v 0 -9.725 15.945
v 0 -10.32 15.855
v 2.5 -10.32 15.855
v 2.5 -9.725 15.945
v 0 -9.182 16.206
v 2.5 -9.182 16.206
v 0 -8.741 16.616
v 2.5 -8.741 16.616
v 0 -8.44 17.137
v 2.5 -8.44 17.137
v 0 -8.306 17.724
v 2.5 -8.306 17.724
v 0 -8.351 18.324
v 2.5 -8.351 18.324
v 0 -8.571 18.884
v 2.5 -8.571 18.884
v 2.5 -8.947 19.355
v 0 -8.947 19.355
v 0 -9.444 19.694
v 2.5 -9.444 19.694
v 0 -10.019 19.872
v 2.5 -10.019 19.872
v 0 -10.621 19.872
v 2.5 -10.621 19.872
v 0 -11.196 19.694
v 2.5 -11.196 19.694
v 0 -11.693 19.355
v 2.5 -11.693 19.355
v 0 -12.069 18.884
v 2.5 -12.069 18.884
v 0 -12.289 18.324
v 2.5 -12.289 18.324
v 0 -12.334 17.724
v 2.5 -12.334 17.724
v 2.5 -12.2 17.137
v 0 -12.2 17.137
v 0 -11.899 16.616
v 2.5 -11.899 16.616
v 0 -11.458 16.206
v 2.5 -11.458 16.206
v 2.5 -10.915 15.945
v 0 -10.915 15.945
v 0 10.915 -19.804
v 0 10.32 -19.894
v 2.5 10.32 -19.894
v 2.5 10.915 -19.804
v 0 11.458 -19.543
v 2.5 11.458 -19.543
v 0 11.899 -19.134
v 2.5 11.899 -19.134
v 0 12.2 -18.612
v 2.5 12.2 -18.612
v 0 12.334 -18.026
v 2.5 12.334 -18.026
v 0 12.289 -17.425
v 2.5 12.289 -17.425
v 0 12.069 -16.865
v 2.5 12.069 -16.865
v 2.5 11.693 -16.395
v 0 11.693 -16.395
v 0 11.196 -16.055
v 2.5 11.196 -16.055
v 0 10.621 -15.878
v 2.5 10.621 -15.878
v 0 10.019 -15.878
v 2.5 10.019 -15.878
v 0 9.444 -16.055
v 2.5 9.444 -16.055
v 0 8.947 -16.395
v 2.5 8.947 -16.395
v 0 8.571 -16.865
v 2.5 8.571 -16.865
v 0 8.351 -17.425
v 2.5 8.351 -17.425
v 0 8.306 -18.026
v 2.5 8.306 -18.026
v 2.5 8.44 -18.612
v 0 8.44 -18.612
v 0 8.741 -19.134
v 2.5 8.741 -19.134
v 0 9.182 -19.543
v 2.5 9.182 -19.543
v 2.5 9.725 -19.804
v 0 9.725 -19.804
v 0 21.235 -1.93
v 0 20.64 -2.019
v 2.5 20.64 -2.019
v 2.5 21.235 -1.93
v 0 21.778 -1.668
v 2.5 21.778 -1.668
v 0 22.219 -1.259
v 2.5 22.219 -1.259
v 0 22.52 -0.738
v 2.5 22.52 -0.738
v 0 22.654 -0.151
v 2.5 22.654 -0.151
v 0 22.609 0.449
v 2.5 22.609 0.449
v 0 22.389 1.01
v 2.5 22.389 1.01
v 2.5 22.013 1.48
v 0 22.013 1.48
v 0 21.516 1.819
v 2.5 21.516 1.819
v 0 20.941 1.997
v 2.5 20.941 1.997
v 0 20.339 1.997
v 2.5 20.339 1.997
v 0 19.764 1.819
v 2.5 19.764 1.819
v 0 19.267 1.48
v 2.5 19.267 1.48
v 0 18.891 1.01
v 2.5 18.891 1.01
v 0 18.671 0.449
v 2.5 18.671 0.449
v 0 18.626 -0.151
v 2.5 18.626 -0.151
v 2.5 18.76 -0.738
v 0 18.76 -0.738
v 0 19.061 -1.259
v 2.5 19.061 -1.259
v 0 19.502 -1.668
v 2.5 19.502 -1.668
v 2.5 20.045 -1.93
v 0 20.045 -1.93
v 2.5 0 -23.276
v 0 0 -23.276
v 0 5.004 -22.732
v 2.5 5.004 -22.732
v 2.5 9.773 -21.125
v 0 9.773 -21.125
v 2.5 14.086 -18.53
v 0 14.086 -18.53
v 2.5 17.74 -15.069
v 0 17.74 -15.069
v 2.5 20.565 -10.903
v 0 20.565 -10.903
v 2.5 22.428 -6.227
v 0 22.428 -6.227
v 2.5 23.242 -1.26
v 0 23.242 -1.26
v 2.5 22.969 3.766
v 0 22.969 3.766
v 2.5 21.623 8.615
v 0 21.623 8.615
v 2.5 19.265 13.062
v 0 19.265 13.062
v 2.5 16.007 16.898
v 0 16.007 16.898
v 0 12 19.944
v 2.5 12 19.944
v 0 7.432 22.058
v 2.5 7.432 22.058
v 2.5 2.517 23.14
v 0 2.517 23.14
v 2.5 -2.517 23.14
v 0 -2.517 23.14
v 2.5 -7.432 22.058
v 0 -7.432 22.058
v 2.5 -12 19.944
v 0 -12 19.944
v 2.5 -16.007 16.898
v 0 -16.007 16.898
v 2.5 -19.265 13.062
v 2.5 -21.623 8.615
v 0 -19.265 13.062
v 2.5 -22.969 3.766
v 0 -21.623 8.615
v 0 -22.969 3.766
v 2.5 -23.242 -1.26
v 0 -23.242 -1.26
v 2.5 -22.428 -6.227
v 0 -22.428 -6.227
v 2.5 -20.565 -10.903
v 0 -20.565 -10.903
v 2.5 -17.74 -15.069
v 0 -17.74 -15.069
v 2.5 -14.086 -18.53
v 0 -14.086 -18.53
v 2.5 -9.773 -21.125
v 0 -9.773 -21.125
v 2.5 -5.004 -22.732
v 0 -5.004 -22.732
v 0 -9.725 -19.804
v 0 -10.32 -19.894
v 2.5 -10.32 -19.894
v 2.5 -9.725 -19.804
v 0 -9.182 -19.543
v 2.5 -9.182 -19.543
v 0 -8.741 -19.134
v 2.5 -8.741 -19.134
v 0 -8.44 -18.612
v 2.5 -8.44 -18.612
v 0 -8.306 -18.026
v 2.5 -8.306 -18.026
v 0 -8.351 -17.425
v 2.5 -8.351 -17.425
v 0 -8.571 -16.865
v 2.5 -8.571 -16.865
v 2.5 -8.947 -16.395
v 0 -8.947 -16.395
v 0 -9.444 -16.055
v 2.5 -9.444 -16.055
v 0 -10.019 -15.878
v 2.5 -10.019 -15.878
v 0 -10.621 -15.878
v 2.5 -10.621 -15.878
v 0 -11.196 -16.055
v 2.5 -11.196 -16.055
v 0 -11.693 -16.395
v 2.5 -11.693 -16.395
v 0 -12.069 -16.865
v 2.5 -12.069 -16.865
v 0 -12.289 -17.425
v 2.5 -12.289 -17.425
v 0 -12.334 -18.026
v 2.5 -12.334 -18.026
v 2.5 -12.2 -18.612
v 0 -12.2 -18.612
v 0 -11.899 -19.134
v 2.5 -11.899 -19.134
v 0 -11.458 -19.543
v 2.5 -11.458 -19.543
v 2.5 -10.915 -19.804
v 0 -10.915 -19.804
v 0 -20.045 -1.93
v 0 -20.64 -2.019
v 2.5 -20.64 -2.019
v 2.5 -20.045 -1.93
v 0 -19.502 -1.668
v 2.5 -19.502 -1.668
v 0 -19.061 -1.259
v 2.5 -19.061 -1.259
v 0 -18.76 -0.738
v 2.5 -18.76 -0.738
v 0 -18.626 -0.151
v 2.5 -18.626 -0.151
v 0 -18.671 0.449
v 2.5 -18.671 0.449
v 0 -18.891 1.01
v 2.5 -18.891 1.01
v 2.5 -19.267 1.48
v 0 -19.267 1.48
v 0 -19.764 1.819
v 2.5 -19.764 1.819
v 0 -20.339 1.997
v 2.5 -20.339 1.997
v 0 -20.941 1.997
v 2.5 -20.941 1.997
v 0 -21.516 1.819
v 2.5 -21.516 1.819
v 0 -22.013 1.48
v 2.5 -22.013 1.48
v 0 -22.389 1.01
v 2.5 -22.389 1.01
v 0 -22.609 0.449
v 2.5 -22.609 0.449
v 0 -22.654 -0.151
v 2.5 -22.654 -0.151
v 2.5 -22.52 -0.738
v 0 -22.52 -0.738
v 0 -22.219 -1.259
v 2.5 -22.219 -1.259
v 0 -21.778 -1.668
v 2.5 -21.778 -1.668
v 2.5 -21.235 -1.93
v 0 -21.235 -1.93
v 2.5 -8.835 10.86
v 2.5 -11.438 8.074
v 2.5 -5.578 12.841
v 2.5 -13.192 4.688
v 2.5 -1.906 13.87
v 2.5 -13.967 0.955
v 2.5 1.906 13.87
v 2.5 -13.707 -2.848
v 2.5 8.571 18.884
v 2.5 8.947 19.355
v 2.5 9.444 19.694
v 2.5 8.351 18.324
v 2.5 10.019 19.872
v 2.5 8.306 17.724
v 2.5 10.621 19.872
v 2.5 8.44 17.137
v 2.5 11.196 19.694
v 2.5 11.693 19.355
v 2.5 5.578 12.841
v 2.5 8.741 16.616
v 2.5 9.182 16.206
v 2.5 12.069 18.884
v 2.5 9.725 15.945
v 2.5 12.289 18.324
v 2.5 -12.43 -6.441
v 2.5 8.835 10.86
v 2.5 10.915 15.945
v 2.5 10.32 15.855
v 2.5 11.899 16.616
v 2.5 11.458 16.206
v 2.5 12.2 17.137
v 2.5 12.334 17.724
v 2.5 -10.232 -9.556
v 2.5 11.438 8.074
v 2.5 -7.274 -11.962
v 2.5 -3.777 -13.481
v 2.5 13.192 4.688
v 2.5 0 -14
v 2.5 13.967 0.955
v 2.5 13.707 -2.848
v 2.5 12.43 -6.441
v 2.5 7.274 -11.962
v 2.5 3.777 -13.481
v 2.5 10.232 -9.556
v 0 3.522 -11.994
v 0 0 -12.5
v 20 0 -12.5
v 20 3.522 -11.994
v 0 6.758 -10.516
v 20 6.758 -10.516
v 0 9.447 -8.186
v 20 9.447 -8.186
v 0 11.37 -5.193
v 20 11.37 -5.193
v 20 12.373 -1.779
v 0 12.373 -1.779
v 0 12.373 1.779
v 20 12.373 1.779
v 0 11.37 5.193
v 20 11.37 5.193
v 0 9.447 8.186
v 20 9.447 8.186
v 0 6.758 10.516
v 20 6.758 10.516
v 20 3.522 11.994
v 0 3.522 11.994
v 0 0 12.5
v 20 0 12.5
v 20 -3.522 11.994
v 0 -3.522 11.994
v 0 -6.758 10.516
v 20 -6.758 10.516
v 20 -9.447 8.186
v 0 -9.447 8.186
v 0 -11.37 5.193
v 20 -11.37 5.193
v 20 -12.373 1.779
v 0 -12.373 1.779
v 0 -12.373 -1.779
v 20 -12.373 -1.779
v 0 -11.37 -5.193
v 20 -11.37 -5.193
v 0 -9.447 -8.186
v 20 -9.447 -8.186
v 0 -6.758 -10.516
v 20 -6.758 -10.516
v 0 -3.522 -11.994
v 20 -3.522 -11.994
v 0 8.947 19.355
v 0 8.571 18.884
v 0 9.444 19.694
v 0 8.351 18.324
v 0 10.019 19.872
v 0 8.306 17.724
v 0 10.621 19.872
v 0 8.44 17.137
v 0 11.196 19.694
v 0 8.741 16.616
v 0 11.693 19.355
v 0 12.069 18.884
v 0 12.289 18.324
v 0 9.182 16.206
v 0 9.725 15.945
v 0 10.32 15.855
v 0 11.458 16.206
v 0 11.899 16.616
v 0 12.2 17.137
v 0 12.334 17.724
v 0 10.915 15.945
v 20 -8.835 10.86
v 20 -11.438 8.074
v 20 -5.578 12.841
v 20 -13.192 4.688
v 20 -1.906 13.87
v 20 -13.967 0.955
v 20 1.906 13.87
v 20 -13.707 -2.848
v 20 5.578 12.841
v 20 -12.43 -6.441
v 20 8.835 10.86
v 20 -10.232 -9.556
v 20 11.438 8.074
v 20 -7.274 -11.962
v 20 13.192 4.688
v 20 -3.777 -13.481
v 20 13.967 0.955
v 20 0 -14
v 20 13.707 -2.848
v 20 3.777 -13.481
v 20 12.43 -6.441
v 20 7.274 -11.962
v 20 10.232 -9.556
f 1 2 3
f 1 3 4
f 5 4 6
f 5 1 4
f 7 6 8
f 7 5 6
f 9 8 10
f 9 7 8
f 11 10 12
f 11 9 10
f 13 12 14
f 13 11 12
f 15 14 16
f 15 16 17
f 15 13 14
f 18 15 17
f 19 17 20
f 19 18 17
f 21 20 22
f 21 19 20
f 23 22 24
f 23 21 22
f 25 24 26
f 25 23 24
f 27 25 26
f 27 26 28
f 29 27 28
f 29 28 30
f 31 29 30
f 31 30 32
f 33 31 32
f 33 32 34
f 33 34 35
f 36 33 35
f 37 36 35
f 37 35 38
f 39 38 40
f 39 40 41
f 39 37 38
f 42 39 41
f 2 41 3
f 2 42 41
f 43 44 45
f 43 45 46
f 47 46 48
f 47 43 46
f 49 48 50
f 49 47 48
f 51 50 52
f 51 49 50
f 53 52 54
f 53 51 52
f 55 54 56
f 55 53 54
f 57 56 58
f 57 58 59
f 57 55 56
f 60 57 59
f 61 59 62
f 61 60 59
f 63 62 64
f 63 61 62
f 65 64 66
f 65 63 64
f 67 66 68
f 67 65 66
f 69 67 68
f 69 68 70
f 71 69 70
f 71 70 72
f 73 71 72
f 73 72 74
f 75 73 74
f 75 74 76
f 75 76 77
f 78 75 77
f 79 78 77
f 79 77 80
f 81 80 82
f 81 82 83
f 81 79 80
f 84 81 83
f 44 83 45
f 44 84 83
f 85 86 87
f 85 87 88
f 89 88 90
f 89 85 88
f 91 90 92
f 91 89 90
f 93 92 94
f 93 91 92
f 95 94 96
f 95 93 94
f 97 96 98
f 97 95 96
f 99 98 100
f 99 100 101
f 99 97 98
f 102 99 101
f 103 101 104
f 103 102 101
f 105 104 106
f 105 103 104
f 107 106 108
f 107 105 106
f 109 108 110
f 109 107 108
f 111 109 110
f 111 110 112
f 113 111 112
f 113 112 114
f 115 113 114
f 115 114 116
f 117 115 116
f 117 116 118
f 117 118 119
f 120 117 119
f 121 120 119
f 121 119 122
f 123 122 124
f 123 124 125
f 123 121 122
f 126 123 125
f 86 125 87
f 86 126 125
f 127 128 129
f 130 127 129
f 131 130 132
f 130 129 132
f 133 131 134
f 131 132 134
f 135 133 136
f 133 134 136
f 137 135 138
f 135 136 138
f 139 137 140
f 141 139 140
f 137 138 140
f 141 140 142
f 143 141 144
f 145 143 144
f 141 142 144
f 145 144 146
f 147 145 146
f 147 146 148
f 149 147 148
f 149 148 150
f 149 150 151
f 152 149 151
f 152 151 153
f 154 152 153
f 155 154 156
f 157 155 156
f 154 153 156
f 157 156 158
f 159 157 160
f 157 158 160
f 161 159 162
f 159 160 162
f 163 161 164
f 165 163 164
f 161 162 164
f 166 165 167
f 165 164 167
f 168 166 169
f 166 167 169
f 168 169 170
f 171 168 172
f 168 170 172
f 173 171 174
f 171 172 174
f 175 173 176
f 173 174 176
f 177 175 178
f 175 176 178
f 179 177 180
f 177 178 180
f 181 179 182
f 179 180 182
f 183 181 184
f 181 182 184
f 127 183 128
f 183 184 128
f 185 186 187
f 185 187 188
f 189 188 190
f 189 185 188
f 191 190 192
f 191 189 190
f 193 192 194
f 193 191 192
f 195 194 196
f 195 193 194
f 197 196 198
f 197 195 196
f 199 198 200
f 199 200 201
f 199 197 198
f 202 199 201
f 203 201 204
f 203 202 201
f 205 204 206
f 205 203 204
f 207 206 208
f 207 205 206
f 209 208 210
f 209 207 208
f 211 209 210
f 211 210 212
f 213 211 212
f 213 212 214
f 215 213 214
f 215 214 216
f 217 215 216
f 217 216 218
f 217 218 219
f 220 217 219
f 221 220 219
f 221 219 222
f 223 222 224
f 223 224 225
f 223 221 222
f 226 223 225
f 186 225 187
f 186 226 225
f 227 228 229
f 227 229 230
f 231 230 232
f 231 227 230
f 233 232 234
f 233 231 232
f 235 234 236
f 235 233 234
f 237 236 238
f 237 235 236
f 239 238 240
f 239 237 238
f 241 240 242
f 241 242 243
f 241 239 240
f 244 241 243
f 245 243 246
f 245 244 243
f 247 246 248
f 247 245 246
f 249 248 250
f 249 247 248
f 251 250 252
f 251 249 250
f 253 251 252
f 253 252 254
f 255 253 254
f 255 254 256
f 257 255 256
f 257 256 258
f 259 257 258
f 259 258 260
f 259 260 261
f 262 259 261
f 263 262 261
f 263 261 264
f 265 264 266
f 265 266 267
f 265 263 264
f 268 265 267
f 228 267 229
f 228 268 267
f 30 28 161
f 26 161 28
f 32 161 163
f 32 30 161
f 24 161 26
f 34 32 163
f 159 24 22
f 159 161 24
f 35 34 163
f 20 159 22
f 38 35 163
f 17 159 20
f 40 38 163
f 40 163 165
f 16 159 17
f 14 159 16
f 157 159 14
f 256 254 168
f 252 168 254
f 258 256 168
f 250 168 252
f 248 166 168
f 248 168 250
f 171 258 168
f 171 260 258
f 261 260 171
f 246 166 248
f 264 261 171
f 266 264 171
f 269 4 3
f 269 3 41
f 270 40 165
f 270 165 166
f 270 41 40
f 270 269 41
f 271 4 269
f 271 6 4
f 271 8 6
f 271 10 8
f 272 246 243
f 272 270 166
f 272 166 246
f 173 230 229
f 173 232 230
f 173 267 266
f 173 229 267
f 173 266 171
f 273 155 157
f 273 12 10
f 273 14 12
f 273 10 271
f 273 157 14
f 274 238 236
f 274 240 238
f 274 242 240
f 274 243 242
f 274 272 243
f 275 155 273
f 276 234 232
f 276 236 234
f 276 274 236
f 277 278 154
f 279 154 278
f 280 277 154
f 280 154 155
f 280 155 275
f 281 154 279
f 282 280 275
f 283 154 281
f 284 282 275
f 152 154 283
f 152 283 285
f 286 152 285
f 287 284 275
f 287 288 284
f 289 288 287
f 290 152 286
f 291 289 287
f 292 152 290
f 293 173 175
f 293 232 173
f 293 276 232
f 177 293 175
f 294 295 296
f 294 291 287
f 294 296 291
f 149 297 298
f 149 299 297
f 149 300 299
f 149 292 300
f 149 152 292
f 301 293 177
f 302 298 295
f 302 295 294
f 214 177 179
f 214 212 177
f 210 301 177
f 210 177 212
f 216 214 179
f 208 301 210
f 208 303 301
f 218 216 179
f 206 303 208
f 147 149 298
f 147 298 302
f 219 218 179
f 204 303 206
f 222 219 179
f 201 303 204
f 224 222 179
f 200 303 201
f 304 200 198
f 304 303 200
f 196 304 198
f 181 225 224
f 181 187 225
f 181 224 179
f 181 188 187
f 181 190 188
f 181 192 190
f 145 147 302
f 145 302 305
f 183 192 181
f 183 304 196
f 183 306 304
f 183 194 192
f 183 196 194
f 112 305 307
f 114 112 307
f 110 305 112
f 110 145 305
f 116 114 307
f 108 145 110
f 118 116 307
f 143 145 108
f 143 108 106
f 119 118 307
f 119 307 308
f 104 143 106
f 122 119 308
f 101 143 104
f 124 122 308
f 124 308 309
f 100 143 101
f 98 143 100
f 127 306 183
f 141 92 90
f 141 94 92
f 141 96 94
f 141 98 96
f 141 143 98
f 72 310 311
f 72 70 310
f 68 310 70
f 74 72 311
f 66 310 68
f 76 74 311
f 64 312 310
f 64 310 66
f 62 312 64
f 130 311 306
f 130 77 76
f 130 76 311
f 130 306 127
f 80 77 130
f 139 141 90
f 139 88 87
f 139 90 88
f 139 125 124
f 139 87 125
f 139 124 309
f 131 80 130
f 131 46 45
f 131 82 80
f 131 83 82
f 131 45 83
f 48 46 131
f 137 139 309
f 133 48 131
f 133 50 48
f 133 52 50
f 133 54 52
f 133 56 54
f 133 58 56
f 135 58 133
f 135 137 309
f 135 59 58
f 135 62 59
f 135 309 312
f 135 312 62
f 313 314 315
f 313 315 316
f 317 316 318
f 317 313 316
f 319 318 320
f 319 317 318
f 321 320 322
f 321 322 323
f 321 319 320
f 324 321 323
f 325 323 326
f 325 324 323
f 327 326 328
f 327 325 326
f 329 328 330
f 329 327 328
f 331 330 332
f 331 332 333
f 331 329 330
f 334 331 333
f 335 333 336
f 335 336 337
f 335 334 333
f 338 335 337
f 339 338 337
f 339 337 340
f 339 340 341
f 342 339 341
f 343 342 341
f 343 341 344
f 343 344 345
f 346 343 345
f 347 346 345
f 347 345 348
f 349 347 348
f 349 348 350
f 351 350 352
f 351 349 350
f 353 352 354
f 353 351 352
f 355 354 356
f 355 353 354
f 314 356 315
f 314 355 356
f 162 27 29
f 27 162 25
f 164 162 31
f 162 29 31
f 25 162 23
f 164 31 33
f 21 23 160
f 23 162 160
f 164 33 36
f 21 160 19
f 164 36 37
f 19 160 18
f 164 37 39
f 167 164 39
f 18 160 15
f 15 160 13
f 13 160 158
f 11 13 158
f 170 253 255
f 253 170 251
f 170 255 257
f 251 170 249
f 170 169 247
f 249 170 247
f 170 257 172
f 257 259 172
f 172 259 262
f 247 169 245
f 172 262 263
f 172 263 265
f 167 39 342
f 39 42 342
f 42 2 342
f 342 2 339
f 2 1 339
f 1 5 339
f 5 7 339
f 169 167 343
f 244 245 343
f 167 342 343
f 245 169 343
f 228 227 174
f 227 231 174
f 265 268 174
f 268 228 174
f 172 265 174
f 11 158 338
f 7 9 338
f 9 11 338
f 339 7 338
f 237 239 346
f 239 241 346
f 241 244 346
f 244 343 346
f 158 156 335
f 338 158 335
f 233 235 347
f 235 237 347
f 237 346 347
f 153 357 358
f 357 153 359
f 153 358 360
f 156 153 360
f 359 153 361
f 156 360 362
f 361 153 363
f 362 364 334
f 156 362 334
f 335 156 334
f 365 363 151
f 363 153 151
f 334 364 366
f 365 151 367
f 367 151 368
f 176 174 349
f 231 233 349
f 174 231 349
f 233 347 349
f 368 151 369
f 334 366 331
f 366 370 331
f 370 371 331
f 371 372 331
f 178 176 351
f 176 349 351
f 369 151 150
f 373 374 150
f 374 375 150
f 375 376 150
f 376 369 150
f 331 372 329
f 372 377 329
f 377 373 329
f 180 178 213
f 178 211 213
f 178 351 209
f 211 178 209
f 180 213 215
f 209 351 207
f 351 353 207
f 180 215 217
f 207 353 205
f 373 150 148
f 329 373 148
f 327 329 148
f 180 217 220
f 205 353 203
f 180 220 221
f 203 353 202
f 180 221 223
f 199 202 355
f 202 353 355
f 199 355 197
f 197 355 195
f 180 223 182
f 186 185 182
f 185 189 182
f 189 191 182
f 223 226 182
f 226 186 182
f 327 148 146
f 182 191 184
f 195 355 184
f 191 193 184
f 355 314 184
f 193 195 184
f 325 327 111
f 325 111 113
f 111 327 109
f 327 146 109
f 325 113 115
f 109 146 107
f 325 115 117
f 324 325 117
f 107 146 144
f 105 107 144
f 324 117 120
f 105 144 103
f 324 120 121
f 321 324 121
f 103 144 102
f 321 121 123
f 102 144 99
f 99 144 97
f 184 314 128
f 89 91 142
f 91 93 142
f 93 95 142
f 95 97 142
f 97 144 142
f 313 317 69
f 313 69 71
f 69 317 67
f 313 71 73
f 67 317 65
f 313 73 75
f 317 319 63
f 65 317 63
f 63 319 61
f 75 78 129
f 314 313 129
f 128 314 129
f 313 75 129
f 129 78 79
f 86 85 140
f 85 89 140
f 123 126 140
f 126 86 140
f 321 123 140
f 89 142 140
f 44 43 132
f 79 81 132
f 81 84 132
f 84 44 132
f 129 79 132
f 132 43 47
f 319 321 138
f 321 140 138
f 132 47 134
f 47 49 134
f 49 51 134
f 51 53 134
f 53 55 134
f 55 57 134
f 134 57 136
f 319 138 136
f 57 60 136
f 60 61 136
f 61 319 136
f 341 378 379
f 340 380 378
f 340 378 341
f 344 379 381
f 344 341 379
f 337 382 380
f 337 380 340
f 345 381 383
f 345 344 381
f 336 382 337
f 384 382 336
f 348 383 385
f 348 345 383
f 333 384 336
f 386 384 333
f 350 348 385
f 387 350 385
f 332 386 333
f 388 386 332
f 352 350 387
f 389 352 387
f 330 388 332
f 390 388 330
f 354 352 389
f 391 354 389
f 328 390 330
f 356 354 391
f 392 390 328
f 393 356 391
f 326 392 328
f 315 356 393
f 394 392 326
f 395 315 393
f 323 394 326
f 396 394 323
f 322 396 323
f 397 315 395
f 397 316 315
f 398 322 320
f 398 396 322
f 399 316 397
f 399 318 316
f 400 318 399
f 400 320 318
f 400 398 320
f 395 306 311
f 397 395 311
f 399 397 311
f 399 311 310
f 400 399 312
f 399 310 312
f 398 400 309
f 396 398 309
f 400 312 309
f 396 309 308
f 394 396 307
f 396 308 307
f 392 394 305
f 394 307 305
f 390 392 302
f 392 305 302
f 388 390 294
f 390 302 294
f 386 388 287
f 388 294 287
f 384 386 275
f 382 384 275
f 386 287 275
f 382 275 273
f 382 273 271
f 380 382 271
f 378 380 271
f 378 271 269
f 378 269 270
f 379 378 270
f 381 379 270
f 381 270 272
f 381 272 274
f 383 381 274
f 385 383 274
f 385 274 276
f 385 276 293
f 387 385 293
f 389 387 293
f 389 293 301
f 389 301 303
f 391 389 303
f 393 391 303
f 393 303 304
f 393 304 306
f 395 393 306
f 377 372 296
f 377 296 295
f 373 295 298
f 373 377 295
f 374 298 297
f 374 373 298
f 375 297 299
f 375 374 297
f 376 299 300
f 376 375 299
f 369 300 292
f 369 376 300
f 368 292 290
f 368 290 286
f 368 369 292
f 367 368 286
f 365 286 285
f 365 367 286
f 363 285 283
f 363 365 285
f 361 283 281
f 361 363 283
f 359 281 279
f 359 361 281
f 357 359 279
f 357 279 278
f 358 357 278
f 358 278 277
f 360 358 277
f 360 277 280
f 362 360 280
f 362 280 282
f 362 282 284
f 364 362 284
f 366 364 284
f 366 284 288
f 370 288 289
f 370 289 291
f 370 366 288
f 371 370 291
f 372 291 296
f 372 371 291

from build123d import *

# Parameters (mm, degrees)
SKETCH1_R           = 23.276074499
SKETCH1_R_2         = 2.0193
BOSS_EXTRUDE1_DEPTH = 2.5
SKETCH4_R           = 14
CUT_EXTRUDE2_DEPTH  = 30.8125
SKETCH5_R           = 14
SKETCH5_R_2         = 12.5
BOSS_EXTRUDE2_DEPTH = 20


with BuildPart() as part:
    # Sketch1 → Boss-Extrude1 (new body)
    with BuildSketch(Plane(origin=(0, 0, 0), x_dir=(0, 0, -1), z_dir=(1, 0, 0))):
        Circle(SKETCH1_R)
        with Locations((0, 20.64)):
            Circle(SKETCH1_R_2, mode=Mode.SUBTRACT)
        with Locations((17.874764334, 10.32)):
            Circle(SKETCH1_R_2, mode=Mode.SUBTRACT)
        with Locations((17.874764334, -10.32)):
            Circle(SKETCH1_R_2, mode=Mode.SUBTRACT)
        with Locations((0, -20.64)):
            Circle(SKETCH1_R_2, mode=Mode.SUBTRACT)
        with Locations((-17.874764334, -10.32)):
            Circle(SKETCH1_R_2, mode=Mode.SUBTRACT)
        with Locations((-17.874764334, 10.32)):
            Circle(SKETCH1_R_2, mode=Mode.SUBTRACT)
    extrude(amount=BOSS_EXTRUDE1_DEPTH)

    # Sketch4 → Cut-Extrude2 (cut)
    with BuildSketch(Plane.ZY):
        Circle(SKETCH4_R)
    extrude(amount=-CUT_EXTRUDE2_DEPTH, mode=Mode.SUBTRACT)

    # Sketch5 → Boss-Extrude2 (add)
    with BuildSketch(Plane(origin=(0, 0, 0), x_dir=(0, 0, -1), z_dir=(1, 0, 0))):
        Circle(SKETCH5_R)
        Circle(SKETCH5_R_2, mode=Mode.SUBTRACT)
    extrude(amount=BOSS_EXTRUDE2_DEPTH)


solid = part.part
